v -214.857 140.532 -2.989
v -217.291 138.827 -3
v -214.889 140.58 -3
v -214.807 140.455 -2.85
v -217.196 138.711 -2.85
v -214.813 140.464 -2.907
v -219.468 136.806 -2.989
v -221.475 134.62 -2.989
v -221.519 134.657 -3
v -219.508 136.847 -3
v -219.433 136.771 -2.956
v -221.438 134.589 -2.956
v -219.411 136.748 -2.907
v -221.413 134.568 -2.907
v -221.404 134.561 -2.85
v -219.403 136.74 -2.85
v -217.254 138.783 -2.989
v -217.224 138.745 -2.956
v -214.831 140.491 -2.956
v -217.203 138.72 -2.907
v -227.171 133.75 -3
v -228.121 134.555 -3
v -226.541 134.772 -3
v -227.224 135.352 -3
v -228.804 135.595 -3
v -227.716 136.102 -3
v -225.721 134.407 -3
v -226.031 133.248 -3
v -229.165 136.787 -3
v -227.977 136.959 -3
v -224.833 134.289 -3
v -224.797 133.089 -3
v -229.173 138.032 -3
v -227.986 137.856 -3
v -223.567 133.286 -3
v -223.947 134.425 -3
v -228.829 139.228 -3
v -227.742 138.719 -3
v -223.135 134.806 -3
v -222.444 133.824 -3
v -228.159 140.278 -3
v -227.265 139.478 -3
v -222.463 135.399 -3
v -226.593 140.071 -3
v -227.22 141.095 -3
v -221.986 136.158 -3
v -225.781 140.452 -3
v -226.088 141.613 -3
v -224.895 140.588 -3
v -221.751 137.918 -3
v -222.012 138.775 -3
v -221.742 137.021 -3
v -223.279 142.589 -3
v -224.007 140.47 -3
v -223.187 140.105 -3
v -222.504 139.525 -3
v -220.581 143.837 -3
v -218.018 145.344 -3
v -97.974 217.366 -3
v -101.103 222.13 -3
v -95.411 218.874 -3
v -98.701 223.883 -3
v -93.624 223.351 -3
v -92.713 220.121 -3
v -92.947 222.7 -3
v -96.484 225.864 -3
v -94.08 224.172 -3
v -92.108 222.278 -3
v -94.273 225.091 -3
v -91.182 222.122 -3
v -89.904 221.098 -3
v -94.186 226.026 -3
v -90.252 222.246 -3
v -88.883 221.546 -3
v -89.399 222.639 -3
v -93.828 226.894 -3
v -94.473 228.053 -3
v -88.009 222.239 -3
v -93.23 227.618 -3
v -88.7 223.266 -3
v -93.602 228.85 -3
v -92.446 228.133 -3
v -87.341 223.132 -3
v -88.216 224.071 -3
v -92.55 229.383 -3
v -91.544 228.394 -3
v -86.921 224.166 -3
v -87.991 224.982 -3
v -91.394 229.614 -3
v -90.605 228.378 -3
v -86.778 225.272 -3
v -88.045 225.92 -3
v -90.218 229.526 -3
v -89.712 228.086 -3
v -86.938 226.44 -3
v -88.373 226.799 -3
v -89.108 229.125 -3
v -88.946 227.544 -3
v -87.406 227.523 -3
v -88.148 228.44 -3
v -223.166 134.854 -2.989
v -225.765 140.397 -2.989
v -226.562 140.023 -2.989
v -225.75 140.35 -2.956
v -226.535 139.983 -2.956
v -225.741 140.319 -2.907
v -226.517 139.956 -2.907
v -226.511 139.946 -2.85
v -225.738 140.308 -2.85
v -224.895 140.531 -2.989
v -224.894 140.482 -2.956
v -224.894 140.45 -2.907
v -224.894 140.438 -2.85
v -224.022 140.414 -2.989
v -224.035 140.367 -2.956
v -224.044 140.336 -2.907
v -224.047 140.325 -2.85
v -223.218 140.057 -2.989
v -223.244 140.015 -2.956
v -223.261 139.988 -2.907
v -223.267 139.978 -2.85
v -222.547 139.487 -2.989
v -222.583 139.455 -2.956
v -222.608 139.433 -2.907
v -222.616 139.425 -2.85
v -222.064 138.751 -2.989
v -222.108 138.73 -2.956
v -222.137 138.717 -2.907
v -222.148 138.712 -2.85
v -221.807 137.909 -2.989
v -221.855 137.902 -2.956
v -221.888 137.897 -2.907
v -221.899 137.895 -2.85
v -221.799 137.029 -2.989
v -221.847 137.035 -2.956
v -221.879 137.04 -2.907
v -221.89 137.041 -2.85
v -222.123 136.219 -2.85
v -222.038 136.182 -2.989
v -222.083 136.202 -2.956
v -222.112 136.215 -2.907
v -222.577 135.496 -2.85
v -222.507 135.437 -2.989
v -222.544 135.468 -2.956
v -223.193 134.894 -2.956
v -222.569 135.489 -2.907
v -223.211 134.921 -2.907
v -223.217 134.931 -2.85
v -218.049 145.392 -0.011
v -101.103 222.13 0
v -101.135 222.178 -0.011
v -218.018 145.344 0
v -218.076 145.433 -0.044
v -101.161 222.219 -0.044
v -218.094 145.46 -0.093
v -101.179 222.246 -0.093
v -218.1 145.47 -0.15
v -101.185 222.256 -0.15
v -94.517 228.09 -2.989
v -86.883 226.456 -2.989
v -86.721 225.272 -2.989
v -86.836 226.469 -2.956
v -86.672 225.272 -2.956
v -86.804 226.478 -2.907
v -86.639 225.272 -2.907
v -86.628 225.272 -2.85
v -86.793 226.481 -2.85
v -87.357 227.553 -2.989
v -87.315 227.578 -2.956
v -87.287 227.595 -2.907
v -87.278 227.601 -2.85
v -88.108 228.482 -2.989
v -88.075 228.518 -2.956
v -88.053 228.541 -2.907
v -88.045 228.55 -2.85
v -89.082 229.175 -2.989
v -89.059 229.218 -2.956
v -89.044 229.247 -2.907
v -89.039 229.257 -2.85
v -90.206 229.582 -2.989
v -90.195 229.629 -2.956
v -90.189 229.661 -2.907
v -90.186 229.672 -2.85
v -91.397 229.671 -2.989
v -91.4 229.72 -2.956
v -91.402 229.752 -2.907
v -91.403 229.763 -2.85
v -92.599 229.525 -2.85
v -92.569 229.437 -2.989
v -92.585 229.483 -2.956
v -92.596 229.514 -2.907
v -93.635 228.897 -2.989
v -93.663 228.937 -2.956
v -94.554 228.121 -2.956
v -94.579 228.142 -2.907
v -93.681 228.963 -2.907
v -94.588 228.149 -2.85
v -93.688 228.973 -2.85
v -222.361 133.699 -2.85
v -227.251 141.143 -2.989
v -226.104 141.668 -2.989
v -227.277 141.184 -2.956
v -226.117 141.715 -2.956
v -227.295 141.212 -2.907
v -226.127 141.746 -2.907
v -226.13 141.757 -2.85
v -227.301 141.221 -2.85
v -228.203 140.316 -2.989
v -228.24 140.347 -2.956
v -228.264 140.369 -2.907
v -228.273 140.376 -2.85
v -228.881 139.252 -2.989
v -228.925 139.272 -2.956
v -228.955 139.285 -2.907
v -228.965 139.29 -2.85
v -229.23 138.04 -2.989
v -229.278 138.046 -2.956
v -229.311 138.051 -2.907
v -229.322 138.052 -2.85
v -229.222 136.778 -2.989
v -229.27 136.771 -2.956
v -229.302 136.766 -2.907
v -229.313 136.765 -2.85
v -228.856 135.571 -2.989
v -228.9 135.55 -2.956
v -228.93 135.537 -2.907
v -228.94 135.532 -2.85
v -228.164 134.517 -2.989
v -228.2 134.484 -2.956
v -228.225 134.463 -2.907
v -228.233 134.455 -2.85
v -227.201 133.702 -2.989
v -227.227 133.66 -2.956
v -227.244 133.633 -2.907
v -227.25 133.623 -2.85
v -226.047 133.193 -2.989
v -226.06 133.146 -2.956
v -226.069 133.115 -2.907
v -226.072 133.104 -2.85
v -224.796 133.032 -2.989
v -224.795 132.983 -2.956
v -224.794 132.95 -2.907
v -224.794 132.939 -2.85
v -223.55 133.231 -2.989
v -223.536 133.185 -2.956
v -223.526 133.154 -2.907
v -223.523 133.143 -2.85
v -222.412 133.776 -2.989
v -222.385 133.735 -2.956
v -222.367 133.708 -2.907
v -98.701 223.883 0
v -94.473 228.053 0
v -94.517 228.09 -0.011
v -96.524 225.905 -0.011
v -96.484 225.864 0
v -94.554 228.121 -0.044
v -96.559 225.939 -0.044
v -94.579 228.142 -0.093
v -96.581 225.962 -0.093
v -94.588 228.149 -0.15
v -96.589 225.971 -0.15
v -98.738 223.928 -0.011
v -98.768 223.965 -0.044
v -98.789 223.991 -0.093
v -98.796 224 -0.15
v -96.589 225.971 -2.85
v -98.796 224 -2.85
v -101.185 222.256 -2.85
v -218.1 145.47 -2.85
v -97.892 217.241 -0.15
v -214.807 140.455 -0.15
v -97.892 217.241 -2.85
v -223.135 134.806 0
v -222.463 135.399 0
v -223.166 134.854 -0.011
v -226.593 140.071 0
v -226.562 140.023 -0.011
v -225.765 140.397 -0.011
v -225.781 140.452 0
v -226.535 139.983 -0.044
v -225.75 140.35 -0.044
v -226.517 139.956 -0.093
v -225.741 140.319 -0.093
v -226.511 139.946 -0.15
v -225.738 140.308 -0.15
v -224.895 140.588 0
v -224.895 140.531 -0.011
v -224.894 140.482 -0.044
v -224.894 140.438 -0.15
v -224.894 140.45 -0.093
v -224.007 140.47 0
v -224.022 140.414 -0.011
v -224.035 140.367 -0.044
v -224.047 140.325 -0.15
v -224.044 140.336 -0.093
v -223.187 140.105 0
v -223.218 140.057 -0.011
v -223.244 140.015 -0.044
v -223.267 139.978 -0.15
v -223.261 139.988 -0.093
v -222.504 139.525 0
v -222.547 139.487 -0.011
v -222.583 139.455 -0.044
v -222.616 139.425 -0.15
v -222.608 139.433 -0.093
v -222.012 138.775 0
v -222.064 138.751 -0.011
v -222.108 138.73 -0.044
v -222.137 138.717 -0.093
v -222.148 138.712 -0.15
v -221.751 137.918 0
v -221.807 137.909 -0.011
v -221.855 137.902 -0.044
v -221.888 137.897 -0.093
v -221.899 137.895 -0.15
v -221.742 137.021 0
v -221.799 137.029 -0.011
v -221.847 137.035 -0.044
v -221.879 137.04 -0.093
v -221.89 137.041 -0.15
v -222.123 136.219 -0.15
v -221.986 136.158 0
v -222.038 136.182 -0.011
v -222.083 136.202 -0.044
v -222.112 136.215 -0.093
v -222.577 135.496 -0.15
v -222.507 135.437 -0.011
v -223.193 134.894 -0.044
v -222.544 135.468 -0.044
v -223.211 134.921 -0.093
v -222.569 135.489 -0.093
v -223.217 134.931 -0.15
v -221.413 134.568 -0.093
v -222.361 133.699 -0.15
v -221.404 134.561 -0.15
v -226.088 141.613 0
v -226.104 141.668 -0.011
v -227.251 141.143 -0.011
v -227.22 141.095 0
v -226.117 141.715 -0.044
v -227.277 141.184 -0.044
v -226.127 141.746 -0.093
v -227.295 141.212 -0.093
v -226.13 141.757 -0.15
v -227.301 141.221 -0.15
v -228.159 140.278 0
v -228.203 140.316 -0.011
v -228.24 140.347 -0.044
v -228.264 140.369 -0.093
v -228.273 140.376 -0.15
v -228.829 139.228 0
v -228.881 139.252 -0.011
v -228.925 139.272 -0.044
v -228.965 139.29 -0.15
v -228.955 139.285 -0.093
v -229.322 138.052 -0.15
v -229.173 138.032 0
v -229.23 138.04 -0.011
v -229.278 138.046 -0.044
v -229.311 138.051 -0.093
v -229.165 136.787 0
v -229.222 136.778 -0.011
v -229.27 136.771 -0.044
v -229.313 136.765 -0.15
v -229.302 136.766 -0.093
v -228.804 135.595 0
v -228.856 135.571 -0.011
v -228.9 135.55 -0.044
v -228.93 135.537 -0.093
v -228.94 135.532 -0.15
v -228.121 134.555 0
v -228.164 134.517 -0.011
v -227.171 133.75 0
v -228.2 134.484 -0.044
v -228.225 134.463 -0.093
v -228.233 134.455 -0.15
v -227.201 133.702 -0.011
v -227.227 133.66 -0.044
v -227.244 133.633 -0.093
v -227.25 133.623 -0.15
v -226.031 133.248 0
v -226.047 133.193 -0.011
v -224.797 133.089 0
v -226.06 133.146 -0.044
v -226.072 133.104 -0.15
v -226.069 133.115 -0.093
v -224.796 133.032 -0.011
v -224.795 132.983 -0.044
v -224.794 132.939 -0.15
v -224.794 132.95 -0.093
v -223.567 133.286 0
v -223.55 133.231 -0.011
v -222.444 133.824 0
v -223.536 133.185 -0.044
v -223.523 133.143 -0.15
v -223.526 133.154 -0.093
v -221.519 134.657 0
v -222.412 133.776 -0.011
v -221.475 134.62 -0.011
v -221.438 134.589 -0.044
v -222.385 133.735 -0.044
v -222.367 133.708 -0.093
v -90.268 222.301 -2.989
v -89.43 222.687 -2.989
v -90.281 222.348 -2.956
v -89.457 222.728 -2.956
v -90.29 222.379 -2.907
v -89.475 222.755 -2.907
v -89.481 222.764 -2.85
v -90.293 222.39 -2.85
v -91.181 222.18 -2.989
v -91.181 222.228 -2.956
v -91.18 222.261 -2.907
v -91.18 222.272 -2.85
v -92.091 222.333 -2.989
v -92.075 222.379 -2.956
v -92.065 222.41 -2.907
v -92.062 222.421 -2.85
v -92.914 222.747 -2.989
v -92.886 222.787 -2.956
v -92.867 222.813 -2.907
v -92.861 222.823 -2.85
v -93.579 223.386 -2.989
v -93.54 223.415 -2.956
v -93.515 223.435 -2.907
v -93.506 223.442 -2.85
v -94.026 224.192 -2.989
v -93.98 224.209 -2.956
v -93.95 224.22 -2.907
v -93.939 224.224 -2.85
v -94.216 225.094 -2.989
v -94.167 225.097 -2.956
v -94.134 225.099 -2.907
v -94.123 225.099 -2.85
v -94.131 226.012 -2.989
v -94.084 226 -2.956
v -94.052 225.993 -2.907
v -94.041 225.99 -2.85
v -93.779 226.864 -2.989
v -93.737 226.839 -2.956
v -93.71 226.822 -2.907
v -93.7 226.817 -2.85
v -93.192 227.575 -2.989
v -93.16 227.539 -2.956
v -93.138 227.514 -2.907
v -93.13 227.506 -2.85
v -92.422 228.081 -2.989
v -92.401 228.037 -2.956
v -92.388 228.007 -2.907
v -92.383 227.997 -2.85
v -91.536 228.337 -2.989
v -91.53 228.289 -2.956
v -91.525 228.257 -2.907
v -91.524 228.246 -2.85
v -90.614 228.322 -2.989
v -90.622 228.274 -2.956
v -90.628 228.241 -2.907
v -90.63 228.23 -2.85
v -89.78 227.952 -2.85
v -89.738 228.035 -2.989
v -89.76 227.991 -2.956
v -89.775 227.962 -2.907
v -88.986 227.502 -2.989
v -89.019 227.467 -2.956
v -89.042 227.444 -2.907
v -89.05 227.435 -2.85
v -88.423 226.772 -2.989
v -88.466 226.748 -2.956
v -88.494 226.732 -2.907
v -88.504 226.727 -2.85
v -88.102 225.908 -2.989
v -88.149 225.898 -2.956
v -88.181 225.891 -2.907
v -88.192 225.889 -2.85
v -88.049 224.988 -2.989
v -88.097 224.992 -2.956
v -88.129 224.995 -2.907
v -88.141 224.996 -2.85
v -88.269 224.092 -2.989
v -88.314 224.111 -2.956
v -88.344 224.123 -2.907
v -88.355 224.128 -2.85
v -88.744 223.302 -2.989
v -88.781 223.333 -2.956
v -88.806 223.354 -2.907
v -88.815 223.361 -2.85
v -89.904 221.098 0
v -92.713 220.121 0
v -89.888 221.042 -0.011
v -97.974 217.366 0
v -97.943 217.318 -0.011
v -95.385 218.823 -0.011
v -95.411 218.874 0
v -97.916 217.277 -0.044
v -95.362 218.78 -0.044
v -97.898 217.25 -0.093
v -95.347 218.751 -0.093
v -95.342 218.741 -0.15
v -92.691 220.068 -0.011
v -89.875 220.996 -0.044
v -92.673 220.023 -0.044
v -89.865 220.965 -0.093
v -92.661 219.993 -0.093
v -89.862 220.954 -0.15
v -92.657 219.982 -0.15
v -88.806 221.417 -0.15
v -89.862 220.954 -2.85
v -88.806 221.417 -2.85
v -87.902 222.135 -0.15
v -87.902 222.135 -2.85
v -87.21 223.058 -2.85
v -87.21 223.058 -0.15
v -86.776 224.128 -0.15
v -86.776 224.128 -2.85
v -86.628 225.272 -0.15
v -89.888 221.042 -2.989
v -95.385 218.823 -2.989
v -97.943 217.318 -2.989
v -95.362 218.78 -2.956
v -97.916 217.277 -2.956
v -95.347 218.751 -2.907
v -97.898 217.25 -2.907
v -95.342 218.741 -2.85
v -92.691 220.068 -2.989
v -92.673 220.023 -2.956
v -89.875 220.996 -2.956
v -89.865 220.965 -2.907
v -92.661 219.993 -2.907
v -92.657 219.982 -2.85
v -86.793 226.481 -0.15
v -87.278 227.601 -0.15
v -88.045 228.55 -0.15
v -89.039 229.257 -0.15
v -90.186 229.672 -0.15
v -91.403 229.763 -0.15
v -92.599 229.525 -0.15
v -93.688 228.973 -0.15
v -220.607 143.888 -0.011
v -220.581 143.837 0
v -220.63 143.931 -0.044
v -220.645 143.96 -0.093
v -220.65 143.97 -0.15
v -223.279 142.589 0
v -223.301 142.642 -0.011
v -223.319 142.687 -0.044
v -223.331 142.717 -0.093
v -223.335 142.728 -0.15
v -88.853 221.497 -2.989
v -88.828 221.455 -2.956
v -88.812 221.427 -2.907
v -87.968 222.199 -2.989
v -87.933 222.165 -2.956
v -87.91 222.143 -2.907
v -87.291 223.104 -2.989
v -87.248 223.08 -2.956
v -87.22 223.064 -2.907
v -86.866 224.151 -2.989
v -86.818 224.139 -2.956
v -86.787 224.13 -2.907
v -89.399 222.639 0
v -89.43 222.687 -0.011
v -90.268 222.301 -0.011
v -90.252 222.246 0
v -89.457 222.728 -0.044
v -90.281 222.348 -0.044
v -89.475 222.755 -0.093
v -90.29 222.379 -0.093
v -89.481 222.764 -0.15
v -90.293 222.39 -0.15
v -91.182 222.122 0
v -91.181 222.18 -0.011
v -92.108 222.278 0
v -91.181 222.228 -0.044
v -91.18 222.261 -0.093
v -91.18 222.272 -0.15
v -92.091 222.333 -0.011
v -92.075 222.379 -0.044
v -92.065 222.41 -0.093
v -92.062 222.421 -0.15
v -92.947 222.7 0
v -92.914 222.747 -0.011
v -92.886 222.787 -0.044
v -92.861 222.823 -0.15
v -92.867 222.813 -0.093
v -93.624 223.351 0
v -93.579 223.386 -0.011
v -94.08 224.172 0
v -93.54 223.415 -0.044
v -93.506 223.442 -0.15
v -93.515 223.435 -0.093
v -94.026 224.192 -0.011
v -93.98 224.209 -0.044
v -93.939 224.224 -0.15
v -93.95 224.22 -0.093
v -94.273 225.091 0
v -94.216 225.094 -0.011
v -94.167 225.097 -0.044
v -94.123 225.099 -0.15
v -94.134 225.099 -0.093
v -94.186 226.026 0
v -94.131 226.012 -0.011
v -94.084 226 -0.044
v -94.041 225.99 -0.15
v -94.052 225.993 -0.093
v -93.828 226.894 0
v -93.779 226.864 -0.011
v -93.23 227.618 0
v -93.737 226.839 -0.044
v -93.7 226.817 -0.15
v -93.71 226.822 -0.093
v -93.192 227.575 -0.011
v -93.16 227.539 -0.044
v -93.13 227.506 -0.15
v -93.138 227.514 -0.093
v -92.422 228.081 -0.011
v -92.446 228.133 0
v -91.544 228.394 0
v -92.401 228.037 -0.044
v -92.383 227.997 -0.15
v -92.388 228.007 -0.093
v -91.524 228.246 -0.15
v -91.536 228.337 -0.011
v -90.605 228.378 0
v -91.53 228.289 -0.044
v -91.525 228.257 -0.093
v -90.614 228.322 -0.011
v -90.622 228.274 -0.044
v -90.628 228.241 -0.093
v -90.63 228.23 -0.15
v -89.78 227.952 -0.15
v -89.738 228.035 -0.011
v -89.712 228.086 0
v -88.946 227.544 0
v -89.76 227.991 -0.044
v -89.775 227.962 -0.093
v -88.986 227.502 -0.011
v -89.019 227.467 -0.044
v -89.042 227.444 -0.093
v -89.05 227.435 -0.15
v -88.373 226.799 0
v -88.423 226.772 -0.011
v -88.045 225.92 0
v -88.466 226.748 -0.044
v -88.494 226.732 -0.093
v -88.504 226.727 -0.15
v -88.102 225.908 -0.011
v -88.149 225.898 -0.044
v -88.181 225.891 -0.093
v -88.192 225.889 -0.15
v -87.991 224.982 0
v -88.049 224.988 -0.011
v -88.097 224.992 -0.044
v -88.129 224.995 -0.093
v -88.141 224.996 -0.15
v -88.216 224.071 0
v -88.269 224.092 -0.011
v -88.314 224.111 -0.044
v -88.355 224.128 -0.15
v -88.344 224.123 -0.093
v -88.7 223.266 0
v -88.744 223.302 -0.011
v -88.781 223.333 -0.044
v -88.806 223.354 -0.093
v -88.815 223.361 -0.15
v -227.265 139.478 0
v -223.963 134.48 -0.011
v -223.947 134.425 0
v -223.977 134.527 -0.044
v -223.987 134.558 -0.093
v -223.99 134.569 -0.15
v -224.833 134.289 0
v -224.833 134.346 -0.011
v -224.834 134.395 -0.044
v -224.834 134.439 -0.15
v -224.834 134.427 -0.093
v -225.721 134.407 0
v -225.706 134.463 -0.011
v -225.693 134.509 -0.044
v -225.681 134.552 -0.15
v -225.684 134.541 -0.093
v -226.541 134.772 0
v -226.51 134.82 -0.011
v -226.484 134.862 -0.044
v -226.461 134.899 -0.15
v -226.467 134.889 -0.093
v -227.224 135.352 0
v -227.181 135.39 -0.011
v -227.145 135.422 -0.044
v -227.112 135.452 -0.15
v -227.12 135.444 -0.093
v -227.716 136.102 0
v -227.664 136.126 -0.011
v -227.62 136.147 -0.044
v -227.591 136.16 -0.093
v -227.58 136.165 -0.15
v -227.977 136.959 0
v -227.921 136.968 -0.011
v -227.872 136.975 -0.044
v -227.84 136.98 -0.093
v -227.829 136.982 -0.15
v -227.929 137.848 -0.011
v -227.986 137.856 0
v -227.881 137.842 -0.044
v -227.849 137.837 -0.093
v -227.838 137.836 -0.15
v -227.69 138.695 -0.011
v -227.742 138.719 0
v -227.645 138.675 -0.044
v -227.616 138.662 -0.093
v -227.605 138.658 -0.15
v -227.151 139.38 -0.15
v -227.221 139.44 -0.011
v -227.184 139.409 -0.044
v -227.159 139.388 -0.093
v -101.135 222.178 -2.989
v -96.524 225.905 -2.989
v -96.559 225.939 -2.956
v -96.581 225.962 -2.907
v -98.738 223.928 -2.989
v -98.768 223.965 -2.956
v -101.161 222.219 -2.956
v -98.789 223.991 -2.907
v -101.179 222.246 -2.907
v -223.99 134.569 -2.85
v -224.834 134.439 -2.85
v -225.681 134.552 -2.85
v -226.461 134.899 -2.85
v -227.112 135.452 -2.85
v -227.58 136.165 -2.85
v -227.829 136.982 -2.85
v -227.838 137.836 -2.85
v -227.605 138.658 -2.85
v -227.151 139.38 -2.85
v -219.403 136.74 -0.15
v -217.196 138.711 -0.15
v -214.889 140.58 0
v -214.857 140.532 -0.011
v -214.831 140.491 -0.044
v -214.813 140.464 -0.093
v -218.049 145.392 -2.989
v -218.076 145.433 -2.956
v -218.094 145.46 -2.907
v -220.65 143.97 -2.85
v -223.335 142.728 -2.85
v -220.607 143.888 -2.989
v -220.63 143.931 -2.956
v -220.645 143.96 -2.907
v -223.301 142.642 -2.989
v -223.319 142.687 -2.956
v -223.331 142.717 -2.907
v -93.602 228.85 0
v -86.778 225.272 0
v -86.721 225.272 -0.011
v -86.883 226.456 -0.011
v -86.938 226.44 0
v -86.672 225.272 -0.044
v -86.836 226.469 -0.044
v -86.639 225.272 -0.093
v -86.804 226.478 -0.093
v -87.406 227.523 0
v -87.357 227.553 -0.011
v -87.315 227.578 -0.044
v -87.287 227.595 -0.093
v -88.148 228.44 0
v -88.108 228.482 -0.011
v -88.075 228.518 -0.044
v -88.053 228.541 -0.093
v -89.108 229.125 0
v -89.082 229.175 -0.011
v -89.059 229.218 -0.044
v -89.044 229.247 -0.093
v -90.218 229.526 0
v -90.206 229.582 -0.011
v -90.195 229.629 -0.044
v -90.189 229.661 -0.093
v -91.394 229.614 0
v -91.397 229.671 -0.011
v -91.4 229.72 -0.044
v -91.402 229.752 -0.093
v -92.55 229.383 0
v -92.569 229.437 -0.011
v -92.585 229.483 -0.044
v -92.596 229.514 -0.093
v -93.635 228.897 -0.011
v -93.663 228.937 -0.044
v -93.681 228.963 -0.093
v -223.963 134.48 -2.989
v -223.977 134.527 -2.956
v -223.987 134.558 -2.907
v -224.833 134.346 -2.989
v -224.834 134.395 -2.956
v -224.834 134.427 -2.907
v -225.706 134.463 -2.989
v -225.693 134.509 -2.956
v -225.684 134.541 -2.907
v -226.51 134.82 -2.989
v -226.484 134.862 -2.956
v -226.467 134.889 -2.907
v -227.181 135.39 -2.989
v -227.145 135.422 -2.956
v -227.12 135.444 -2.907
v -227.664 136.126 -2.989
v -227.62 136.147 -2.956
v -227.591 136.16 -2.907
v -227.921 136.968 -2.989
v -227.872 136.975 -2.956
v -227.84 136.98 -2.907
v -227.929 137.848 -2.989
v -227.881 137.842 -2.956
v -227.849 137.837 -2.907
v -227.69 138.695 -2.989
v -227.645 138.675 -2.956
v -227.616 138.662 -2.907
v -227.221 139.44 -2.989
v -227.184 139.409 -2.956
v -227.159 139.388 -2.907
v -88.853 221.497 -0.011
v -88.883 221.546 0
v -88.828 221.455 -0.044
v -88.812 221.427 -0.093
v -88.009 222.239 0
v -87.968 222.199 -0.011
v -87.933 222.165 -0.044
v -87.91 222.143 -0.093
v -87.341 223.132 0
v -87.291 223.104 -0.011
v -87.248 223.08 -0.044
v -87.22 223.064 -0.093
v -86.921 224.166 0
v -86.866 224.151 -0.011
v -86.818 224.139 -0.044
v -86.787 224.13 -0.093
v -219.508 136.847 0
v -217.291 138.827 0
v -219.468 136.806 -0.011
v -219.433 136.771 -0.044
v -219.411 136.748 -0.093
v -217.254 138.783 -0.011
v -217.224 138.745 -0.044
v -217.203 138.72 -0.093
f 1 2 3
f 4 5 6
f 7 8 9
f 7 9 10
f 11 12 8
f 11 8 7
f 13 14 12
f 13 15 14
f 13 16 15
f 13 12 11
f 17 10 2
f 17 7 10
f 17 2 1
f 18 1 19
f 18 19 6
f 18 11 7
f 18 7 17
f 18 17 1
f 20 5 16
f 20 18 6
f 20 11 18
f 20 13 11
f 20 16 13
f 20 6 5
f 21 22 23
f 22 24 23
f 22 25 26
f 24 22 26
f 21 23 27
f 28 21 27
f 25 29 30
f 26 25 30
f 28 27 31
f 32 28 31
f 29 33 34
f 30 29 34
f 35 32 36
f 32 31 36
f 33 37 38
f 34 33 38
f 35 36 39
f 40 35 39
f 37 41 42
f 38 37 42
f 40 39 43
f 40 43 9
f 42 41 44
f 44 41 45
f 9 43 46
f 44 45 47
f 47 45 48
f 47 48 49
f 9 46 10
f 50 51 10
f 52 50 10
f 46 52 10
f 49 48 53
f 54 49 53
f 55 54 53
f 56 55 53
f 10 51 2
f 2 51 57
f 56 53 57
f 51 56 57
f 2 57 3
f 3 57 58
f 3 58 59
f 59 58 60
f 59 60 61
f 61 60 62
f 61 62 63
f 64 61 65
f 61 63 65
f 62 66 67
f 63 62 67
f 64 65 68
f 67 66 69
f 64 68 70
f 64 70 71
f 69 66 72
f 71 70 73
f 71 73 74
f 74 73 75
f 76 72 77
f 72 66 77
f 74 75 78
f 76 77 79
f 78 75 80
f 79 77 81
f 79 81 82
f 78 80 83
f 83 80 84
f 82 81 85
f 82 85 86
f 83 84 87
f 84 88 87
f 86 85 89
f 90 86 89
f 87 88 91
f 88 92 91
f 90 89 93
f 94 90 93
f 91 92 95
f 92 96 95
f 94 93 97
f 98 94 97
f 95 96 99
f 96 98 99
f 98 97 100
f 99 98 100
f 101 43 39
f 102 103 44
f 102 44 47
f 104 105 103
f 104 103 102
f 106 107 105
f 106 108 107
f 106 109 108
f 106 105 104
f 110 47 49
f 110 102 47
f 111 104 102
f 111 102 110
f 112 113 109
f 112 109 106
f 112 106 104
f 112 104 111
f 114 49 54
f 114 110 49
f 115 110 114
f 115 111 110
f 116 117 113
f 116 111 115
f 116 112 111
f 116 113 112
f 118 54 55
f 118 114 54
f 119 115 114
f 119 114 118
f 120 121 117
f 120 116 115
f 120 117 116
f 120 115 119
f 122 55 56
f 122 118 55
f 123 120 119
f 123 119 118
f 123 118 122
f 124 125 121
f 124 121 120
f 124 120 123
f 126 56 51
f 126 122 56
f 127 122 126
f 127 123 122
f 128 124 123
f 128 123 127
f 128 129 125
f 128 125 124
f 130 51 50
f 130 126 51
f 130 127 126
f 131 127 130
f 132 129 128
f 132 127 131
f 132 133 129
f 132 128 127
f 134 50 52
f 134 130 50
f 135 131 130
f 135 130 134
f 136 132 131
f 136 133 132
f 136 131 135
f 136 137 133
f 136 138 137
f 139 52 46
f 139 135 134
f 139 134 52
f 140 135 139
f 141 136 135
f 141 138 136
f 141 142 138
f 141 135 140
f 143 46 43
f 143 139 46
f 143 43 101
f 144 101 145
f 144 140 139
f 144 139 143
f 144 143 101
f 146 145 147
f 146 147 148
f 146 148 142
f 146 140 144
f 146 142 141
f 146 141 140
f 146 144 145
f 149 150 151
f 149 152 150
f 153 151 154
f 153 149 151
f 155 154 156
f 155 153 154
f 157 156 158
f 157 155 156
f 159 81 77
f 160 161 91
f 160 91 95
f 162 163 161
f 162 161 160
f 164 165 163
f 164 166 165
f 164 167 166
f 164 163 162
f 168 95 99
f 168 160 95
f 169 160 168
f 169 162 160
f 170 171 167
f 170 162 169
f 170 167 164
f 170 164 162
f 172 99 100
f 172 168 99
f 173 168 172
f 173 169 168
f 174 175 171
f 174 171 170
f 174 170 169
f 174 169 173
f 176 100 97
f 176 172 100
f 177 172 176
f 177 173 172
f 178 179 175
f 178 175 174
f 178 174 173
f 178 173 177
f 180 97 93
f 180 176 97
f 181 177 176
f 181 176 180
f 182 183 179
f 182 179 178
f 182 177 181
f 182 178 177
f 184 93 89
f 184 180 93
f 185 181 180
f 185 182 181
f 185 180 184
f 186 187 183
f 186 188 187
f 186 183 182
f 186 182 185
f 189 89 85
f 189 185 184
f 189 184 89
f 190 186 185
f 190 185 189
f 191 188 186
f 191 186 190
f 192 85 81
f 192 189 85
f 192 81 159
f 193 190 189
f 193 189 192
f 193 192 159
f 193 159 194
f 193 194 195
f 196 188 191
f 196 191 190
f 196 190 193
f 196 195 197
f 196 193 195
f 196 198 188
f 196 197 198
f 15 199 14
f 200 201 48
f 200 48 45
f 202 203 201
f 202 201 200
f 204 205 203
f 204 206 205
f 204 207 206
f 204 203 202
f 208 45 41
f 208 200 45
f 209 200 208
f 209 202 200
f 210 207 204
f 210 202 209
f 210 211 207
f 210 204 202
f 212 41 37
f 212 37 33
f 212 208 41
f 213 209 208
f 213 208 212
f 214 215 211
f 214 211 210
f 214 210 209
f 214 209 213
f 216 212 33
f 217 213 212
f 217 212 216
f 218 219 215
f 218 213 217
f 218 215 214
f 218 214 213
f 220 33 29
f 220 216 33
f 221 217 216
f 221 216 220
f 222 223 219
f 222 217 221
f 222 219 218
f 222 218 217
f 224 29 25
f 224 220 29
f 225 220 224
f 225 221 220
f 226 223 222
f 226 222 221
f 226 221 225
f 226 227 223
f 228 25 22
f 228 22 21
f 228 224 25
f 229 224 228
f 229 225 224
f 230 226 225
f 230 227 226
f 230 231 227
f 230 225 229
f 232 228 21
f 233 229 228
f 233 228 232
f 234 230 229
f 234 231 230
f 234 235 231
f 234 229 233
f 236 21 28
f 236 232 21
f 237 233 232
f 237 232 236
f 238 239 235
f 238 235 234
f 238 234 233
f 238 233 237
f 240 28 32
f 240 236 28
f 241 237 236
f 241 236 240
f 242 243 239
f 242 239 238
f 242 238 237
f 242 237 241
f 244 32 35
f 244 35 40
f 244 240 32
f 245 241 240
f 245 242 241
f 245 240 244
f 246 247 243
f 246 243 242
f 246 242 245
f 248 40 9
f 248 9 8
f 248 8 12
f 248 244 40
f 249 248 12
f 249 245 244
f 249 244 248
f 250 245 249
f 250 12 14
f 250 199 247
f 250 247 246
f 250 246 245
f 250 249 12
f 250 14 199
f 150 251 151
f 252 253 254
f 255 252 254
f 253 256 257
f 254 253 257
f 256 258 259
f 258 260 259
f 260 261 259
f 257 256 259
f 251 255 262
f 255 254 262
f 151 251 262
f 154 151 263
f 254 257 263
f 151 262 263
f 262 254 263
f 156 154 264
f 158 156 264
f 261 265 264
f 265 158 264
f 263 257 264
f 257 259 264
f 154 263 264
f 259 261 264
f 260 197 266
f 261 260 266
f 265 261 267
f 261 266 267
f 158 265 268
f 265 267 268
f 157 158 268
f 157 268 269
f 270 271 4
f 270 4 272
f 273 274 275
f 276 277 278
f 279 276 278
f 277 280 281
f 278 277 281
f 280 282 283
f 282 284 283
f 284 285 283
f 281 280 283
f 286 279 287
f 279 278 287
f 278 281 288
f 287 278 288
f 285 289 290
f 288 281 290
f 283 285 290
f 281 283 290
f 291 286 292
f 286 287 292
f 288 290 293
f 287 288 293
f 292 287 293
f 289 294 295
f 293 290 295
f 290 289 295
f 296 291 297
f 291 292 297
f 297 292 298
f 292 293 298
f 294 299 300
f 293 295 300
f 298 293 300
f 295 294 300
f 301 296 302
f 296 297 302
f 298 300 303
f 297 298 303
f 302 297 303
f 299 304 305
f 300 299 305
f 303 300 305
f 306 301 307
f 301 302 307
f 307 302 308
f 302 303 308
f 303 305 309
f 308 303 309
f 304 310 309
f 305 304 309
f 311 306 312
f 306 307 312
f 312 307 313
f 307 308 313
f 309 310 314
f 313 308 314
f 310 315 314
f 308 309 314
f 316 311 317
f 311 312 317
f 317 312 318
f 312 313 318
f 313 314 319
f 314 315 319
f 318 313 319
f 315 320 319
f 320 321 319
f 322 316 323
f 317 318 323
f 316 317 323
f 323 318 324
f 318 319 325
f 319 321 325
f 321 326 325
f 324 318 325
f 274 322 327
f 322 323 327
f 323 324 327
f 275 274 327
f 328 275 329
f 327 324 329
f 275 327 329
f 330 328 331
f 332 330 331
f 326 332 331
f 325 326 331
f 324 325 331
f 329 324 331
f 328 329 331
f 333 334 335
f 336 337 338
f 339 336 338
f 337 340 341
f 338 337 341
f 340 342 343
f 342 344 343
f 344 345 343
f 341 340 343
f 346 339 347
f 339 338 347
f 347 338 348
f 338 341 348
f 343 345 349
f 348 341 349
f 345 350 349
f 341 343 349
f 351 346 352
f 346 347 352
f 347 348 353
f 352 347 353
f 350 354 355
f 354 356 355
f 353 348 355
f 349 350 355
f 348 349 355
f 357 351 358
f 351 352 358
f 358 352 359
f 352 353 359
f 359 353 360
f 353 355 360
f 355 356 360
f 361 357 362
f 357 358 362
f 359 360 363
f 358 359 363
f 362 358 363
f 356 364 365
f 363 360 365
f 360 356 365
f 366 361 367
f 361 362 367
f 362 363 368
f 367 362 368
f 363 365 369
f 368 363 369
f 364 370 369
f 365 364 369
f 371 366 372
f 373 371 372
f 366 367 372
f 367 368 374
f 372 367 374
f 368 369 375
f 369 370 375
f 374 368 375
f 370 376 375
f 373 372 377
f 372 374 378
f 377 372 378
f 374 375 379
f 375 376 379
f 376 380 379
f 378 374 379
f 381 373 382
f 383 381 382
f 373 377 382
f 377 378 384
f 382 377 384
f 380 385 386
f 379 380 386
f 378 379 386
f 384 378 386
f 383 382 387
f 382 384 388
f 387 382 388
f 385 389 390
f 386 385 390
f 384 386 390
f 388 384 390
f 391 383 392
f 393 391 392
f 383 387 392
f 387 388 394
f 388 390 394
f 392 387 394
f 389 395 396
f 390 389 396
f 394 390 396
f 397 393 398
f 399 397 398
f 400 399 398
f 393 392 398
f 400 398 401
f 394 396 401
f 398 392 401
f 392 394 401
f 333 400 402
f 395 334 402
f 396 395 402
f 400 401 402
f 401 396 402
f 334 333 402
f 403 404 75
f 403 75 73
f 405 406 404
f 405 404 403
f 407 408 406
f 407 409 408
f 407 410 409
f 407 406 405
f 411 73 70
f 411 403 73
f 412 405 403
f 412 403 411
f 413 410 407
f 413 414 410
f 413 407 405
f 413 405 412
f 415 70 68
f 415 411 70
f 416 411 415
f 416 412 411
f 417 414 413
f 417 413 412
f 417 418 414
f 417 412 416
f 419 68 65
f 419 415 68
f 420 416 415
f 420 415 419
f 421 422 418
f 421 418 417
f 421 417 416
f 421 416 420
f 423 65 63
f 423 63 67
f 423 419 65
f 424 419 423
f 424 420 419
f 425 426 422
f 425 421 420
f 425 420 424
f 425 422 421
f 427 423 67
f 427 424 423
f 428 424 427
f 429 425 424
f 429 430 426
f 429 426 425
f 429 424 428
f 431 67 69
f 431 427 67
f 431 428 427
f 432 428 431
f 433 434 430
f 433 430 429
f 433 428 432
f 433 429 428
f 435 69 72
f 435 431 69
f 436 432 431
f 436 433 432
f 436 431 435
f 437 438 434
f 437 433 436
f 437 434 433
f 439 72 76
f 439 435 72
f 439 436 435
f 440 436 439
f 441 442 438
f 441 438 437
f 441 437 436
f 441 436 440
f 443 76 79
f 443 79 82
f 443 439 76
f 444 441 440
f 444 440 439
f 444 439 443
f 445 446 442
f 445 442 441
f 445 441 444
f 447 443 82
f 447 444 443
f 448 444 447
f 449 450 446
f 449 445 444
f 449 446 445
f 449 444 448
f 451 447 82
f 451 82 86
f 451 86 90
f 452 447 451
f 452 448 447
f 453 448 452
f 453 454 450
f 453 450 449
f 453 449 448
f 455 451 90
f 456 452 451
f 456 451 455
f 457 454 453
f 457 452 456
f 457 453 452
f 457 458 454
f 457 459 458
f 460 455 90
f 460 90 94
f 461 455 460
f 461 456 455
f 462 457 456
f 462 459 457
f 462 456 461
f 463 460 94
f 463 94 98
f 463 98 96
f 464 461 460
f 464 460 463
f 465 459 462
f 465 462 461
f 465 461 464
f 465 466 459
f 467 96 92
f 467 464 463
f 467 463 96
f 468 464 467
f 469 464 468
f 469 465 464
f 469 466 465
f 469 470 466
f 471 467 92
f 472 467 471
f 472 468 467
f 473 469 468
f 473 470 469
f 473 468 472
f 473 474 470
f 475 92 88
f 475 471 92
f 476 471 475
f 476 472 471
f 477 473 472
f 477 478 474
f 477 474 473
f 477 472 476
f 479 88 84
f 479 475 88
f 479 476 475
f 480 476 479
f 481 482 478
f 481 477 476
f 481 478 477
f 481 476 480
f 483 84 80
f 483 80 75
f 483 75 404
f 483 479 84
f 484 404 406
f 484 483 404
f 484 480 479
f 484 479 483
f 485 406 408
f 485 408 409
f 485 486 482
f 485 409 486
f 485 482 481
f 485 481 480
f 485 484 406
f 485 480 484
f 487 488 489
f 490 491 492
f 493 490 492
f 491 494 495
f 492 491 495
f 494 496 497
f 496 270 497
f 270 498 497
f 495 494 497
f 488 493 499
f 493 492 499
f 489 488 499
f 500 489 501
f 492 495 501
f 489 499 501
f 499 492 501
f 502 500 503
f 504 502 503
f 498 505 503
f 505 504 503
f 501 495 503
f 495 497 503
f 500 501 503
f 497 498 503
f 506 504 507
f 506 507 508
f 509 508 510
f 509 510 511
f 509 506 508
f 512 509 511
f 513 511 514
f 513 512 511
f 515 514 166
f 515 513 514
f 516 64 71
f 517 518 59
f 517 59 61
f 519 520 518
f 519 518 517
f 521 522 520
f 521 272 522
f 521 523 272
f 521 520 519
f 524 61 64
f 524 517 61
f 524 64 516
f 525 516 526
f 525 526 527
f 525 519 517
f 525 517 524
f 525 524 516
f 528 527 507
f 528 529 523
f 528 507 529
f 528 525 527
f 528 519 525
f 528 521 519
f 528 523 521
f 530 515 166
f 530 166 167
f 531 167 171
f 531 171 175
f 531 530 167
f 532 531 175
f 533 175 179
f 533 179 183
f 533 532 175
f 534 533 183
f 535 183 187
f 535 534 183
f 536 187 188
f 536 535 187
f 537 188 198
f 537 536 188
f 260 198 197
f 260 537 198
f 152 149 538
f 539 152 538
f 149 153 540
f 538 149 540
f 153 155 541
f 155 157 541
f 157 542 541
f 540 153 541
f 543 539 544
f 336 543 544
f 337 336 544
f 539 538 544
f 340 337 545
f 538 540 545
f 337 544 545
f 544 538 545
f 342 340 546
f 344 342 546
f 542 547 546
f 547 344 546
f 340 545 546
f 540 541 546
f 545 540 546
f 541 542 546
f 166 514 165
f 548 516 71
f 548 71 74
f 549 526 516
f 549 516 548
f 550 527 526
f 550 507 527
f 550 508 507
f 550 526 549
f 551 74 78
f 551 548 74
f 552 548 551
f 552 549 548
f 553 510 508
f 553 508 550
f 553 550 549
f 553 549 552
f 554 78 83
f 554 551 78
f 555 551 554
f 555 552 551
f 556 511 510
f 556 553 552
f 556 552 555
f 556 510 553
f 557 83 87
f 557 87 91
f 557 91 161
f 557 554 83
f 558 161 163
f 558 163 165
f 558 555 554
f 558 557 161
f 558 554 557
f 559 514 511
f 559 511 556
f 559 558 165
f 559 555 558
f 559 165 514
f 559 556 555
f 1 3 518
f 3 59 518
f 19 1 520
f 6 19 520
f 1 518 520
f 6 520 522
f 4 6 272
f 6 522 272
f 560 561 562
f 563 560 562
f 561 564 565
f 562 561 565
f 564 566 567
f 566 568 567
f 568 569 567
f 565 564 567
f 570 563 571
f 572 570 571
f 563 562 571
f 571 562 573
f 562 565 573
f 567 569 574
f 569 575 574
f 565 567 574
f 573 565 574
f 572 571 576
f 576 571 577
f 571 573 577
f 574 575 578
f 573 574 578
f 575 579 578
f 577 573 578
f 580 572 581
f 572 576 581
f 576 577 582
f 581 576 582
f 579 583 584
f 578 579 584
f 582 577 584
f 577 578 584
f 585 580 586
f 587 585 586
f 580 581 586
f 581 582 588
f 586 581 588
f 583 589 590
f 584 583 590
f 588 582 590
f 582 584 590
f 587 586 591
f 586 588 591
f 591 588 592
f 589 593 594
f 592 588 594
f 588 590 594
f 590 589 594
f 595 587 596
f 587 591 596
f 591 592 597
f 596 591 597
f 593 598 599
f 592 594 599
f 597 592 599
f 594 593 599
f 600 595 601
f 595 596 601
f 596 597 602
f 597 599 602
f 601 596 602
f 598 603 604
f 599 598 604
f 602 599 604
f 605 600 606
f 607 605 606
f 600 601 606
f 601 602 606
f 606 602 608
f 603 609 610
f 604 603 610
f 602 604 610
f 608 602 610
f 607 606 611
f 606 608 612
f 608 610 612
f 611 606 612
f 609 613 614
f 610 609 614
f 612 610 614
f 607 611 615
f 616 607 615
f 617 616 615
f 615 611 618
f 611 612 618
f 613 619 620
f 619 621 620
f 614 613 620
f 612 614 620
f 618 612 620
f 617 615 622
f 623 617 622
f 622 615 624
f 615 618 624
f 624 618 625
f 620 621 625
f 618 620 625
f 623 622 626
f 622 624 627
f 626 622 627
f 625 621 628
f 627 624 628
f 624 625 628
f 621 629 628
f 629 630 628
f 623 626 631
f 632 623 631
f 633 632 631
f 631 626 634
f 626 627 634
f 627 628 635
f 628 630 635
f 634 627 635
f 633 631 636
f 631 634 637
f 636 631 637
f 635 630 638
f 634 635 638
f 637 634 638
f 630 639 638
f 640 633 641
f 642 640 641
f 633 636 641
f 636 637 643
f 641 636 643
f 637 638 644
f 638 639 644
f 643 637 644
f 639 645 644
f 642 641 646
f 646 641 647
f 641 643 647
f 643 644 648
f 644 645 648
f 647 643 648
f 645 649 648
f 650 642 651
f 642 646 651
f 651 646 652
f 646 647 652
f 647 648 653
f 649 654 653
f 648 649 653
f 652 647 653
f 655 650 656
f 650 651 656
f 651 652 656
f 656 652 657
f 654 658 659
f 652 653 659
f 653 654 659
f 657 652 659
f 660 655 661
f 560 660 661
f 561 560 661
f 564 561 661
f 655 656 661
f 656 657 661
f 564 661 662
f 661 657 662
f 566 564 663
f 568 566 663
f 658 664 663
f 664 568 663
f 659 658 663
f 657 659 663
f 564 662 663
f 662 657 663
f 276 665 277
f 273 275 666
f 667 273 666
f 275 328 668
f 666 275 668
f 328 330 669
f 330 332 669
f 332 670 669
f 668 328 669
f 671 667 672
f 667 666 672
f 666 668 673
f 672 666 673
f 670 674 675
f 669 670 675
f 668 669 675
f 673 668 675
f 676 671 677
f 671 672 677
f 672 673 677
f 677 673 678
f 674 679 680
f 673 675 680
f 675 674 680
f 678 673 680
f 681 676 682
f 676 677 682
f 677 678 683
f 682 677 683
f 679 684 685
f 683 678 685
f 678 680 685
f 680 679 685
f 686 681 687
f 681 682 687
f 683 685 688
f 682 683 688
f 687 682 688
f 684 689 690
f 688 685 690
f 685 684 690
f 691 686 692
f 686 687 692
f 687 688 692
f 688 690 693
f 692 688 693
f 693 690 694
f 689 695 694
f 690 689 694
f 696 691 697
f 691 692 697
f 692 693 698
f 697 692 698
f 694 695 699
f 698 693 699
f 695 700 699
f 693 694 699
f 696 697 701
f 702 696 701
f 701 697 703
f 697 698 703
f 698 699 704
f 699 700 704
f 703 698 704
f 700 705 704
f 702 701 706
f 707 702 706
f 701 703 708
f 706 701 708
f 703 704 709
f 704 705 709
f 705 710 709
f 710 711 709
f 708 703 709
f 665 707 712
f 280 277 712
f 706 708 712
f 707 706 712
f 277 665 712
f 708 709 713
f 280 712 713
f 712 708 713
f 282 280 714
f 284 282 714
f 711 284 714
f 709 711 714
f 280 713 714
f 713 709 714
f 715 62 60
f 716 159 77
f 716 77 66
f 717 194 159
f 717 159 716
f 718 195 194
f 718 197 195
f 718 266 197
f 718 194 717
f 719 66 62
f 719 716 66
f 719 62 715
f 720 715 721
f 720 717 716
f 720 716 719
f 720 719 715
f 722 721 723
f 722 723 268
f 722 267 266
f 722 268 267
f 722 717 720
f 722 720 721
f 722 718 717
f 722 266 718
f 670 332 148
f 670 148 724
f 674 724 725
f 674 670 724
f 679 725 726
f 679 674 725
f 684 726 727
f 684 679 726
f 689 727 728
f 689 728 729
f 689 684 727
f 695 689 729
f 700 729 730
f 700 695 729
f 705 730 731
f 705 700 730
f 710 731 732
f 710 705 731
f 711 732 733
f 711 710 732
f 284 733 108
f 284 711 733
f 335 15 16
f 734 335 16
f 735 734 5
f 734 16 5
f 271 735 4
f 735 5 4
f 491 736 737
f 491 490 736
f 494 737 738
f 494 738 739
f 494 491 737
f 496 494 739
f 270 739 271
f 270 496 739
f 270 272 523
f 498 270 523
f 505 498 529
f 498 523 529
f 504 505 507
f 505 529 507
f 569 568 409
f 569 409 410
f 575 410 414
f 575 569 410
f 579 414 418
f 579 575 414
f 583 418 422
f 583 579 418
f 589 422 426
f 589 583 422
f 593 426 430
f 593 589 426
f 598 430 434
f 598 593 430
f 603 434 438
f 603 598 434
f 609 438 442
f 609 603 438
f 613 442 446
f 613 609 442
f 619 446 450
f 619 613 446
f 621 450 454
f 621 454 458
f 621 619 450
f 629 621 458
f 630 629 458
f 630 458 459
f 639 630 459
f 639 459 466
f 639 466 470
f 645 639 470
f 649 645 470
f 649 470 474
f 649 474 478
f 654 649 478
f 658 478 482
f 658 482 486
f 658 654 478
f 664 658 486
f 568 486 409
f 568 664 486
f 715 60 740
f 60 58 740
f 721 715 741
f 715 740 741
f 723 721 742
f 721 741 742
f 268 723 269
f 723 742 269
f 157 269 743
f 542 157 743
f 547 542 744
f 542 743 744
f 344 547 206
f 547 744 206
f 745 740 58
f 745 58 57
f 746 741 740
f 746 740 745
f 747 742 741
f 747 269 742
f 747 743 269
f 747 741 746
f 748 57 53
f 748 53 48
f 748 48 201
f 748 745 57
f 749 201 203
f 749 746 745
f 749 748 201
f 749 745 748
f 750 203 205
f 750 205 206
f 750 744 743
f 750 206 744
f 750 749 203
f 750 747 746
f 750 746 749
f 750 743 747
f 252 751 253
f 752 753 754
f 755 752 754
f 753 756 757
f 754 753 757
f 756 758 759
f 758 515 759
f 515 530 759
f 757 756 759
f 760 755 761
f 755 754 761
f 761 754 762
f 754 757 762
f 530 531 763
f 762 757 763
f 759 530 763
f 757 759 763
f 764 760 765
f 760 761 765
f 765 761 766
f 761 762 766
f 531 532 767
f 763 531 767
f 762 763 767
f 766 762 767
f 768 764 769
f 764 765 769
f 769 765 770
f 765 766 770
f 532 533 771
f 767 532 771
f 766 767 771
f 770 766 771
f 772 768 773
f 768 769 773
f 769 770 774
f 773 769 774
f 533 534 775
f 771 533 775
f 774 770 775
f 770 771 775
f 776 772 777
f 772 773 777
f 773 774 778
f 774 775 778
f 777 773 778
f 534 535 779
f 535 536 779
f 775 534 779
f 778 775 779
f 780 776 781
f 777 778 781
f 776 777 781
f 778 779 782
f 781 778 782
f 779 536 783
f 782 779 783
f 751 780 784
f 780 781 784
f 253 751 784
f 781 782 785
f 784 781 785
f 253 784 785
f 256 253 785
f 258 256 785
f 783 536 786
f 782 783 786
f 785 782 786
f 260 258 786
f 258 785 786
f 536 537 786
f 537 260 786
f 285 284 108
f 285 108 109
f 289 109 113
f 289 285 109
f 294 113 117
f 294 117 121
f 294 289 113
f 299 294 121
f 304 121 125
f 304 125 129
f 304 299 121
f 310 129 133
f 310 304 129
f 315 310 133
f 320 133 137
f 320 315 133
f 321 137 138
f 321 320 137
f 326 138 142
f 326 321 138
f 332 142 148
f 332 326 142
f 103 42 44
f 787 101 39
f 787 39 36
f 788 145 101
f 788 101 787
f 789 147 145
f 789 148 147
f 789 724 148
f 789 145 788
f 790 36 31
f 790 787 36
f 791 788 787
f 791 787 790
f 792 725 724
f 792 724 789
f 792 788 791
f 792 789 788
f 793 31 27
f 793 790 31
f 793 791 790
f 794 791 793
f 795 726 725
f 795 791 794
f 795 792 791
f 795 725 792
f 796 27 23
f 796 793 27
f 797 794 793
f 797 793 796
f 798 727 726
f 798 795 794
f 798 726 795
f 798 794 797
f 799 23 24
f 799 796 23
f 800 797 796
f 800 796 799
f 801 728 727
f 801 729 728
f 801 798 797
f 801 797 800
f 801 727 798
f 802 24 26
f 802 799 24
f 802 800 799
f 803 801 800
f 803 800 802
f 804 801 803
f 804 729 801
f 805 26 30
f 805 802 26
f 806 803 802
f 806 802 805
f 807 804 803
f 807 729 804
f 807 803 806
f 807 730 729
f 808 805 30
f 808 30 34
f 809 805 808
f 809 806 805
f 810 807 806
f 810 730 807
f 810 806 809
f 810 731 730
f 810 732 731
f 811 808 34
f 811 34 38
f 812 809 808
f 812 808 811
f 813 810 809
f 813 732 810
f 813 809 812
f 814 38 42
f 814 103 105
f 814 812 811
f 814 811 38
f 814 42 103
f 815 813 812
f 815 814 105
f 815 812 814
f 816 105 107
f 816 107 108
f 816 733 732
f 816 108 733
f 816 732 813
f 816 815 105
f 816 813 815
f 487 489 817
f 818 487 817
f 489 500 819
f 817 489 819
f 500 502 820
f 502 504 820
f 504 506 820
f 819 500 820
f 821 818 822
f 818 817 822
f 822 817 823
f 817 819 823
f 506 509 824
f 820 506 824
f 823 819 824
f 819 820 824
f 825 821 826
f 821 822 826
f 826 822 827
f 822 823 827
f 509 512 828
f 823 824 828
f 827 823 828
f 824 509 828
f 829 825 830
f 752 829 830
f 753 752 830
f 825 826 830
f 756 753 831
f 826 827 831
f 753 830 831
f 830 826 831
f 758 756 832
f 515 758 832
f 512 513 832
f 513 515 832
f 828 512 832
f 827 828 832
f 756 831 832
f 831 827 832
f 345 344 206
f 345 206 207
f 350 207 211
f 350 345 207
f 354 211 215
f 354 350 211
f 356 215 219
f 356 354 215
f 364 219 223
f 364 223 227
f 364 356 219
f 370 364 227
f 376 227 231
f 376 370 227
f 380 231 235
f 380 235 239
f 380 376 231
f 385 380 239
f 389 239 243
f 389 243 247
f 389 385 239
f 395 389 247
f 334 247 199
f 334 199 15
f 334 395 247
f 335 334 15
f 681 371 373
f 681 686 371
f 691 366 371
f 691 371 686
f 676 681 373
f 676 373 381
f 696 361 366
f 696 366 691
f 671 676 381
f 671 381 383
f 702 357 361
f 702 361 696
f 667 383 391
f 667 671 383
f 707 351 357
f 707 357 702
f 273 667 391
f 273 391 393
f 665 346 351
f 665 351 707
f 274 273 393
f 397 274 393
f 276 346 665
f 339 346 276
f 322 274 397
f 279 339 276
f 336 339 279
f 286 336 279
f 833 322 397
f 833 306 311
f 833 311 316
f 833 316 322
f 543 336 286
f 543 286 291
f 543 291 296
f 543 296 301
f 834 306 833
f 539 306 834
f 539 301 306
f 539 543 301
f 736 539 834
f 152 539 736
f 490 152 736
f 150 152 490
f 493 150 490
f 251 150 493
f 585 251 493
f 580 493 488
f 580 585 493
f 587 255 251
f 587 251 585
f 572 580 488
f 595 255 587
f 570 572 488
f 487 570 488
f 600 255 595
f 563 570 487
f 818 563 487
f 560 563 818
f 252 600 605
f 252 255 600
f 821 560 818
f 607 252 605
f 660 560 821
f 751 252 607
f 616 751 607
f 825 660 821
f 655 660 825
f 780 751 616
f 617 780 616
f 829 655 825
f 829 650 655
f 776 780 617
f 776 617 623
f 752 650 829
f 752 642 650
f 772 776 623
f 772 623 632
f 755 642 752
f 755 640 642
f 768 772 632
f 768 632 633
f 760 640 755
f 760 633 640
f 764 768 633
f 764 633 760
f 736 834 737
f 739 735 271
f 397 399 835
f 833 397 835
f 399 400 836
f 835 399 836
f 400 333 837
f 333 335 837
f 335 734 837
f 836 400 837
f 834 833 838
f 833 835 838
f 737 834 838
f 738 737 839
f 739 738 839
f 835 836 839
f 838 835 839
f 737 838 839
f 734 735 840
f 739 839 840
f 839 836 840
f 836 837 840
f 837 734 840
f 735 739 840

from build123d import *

# Parameters (mm, degrees)
BOSS_EXTRUDE1_DEPTH = 3
FILLET1_R           = 30
FILLET2_R           = 0.15


with BuildPart() as part:
    # Sketch1 → Boss-Extrude1 (new body)
    with BuildSketch(Plane.XY):
        with BuildLine():
            ThreePointArc((-86.628036754, 225.271869825), (-90.793972357, 229.759452802), (-95.578437189, 225.938155026))
            Line((-95.578437189, 225.938155026), (-92.774912725, 227.779418336))
            ThreePointArc((-92.774912725, 227.779418336), (-88.620488243, 226.918745795), (-89.481160784, 222.764321313))
            Line((-89.481160784, 222.764321313), (-92.284685248, 220.923058003))
            ThreePointArc((-92.284685248, 220.923058003), (-88.38531167, 221.704313363), (-86.628036754, 225.271869825))
        make_face()
        with BuildLine():
            Line((-92.774912725, 227.779418336), (-95.578437189, 225.938155026))
            ThreePointArc((-95.578437189, 225.938155026), (-94.889359522, 222.801555869), (-92.284685248, 220.923058003))
            Line((-92.284685248, 220.923058003), (-89.481160784, 222.764321313))
            ThreePointArc((-89.481160784, 222.764321313), (-93.635585266, 223.624993854), (-92.774912725, 227.779418336))
        make_face()
        with BuildLine():
            ThreePointArc((-223.217081393, 134.93093621), (-227.371505875, 135.79160875), (-226.510833335, 139.946033232))
            Line((-226.510833335, 139.946033232), (-223.70730887, 141.787296543))
            ThreePointArc((-223.70730887, 141.787296543), (-228.625280131, 134.968170765), (-220.413556929, 136.77219952))
            Line((-220.413556929, 136.77219952), (-223.217081393, 134.93093621))
        make_face()
        with BuildLine():
            Line((-223.70730887, 141.787296543), (-226.510833335, 139.946033232))
            ThreePointArc((-226.510833335, 139.946033232), (-222.356408852, 139.085360692), (-223.217081393, 134.93093621))
            Line((-223.217081393, 134.93093621), (-220.413556929, 136.77219952))
            ThreePointArc((-220.413556929, 136.77219952), (-220.376374386, 137.104420324), (-220.363957364, 137.438484721))
            ThreePointArc((-220.363957364, 137.438484721), (-221.296400902, 140.181209806), (-223.70730887, 141.787296543))
        make_face()
        with BuildLine():
            Line((-95.578437189, 225.938155026), (-223.70730887, 141.787296543))
            ThreePointArc((-223.70730887, 141.787296543), (-221.296400902, 140.181209806), (-220.363957364, 137.438484721))
            ThreePointArc((-220.363957364, 137.438484721), (-220.376374386, 137.104420324), (-220.413556929, 136.77219952))
            Line((-220.413556929, 136.77219952), (-92.284685248, 220.923058003))
            ThreePointArc((-92.284685248, 220.923058003), (-94.889359522, 222.801555869), (-95.578437189, 225.938155026))
        make_face()
    extrude(amount=-BOSS_EXTRUDE1_DEPTH)

    # Fillet1
    fillet1_edges = [part.edges().sort_by_distance(p)[0] for p in [
        (-95.578437189, 225.938155026, -1.5),
        (-92.284685248, 220.923058003, -1.5),
        (-220.413556929, 136.77219952, -1.5),
        (-223.70730887, 141.787296543, -1.5),
    ]]
    fillet(fillet1_edges, radius=FILLET1_R)

    # Fillet2
    fillet2_edges = [part.edges().sort_by_distance(p)[0] for p in [
        (-228.625280131, 134.968170765, 0),
        (-228.625280131, 134.968170765, -3),
        (-156.349121088, 178.847628761, 0),
        (-156.349121088, 178.847628761, -3),
        (-89.481160784, 222.764321313, -3),
        (-87.366713987, 227.742183781, 0),
        (-87.366713987, 227.742183781, -3),
        (-159.64287303, 183.862725784, 0),
        (-159.64287303, 183.862725784, -3),
        (-218.323694728, 137.752482748, 0),
        (-218.323694728, 137.752482748, -3),
        (-94.01456375, 219.394660282, 0),
        (-226.510833335, 139.946033232, -3),
        (-94.01456375, 219.394660282, -3),
        (-221.977430368, 143.315694264, 0),
        (-221.977430368, 143.315694264, -3),
        (-97.66829939, 224.957871798, 0),
        (-97.66829939, 224.957871798, -3),
        (-226.510833335, 139.946033232, 0),
        (-89.481160784, 222.764321313, 0),
    ]]
    fillet(fillet2_edges, radius=FILLET2_R)


solid = part.part
